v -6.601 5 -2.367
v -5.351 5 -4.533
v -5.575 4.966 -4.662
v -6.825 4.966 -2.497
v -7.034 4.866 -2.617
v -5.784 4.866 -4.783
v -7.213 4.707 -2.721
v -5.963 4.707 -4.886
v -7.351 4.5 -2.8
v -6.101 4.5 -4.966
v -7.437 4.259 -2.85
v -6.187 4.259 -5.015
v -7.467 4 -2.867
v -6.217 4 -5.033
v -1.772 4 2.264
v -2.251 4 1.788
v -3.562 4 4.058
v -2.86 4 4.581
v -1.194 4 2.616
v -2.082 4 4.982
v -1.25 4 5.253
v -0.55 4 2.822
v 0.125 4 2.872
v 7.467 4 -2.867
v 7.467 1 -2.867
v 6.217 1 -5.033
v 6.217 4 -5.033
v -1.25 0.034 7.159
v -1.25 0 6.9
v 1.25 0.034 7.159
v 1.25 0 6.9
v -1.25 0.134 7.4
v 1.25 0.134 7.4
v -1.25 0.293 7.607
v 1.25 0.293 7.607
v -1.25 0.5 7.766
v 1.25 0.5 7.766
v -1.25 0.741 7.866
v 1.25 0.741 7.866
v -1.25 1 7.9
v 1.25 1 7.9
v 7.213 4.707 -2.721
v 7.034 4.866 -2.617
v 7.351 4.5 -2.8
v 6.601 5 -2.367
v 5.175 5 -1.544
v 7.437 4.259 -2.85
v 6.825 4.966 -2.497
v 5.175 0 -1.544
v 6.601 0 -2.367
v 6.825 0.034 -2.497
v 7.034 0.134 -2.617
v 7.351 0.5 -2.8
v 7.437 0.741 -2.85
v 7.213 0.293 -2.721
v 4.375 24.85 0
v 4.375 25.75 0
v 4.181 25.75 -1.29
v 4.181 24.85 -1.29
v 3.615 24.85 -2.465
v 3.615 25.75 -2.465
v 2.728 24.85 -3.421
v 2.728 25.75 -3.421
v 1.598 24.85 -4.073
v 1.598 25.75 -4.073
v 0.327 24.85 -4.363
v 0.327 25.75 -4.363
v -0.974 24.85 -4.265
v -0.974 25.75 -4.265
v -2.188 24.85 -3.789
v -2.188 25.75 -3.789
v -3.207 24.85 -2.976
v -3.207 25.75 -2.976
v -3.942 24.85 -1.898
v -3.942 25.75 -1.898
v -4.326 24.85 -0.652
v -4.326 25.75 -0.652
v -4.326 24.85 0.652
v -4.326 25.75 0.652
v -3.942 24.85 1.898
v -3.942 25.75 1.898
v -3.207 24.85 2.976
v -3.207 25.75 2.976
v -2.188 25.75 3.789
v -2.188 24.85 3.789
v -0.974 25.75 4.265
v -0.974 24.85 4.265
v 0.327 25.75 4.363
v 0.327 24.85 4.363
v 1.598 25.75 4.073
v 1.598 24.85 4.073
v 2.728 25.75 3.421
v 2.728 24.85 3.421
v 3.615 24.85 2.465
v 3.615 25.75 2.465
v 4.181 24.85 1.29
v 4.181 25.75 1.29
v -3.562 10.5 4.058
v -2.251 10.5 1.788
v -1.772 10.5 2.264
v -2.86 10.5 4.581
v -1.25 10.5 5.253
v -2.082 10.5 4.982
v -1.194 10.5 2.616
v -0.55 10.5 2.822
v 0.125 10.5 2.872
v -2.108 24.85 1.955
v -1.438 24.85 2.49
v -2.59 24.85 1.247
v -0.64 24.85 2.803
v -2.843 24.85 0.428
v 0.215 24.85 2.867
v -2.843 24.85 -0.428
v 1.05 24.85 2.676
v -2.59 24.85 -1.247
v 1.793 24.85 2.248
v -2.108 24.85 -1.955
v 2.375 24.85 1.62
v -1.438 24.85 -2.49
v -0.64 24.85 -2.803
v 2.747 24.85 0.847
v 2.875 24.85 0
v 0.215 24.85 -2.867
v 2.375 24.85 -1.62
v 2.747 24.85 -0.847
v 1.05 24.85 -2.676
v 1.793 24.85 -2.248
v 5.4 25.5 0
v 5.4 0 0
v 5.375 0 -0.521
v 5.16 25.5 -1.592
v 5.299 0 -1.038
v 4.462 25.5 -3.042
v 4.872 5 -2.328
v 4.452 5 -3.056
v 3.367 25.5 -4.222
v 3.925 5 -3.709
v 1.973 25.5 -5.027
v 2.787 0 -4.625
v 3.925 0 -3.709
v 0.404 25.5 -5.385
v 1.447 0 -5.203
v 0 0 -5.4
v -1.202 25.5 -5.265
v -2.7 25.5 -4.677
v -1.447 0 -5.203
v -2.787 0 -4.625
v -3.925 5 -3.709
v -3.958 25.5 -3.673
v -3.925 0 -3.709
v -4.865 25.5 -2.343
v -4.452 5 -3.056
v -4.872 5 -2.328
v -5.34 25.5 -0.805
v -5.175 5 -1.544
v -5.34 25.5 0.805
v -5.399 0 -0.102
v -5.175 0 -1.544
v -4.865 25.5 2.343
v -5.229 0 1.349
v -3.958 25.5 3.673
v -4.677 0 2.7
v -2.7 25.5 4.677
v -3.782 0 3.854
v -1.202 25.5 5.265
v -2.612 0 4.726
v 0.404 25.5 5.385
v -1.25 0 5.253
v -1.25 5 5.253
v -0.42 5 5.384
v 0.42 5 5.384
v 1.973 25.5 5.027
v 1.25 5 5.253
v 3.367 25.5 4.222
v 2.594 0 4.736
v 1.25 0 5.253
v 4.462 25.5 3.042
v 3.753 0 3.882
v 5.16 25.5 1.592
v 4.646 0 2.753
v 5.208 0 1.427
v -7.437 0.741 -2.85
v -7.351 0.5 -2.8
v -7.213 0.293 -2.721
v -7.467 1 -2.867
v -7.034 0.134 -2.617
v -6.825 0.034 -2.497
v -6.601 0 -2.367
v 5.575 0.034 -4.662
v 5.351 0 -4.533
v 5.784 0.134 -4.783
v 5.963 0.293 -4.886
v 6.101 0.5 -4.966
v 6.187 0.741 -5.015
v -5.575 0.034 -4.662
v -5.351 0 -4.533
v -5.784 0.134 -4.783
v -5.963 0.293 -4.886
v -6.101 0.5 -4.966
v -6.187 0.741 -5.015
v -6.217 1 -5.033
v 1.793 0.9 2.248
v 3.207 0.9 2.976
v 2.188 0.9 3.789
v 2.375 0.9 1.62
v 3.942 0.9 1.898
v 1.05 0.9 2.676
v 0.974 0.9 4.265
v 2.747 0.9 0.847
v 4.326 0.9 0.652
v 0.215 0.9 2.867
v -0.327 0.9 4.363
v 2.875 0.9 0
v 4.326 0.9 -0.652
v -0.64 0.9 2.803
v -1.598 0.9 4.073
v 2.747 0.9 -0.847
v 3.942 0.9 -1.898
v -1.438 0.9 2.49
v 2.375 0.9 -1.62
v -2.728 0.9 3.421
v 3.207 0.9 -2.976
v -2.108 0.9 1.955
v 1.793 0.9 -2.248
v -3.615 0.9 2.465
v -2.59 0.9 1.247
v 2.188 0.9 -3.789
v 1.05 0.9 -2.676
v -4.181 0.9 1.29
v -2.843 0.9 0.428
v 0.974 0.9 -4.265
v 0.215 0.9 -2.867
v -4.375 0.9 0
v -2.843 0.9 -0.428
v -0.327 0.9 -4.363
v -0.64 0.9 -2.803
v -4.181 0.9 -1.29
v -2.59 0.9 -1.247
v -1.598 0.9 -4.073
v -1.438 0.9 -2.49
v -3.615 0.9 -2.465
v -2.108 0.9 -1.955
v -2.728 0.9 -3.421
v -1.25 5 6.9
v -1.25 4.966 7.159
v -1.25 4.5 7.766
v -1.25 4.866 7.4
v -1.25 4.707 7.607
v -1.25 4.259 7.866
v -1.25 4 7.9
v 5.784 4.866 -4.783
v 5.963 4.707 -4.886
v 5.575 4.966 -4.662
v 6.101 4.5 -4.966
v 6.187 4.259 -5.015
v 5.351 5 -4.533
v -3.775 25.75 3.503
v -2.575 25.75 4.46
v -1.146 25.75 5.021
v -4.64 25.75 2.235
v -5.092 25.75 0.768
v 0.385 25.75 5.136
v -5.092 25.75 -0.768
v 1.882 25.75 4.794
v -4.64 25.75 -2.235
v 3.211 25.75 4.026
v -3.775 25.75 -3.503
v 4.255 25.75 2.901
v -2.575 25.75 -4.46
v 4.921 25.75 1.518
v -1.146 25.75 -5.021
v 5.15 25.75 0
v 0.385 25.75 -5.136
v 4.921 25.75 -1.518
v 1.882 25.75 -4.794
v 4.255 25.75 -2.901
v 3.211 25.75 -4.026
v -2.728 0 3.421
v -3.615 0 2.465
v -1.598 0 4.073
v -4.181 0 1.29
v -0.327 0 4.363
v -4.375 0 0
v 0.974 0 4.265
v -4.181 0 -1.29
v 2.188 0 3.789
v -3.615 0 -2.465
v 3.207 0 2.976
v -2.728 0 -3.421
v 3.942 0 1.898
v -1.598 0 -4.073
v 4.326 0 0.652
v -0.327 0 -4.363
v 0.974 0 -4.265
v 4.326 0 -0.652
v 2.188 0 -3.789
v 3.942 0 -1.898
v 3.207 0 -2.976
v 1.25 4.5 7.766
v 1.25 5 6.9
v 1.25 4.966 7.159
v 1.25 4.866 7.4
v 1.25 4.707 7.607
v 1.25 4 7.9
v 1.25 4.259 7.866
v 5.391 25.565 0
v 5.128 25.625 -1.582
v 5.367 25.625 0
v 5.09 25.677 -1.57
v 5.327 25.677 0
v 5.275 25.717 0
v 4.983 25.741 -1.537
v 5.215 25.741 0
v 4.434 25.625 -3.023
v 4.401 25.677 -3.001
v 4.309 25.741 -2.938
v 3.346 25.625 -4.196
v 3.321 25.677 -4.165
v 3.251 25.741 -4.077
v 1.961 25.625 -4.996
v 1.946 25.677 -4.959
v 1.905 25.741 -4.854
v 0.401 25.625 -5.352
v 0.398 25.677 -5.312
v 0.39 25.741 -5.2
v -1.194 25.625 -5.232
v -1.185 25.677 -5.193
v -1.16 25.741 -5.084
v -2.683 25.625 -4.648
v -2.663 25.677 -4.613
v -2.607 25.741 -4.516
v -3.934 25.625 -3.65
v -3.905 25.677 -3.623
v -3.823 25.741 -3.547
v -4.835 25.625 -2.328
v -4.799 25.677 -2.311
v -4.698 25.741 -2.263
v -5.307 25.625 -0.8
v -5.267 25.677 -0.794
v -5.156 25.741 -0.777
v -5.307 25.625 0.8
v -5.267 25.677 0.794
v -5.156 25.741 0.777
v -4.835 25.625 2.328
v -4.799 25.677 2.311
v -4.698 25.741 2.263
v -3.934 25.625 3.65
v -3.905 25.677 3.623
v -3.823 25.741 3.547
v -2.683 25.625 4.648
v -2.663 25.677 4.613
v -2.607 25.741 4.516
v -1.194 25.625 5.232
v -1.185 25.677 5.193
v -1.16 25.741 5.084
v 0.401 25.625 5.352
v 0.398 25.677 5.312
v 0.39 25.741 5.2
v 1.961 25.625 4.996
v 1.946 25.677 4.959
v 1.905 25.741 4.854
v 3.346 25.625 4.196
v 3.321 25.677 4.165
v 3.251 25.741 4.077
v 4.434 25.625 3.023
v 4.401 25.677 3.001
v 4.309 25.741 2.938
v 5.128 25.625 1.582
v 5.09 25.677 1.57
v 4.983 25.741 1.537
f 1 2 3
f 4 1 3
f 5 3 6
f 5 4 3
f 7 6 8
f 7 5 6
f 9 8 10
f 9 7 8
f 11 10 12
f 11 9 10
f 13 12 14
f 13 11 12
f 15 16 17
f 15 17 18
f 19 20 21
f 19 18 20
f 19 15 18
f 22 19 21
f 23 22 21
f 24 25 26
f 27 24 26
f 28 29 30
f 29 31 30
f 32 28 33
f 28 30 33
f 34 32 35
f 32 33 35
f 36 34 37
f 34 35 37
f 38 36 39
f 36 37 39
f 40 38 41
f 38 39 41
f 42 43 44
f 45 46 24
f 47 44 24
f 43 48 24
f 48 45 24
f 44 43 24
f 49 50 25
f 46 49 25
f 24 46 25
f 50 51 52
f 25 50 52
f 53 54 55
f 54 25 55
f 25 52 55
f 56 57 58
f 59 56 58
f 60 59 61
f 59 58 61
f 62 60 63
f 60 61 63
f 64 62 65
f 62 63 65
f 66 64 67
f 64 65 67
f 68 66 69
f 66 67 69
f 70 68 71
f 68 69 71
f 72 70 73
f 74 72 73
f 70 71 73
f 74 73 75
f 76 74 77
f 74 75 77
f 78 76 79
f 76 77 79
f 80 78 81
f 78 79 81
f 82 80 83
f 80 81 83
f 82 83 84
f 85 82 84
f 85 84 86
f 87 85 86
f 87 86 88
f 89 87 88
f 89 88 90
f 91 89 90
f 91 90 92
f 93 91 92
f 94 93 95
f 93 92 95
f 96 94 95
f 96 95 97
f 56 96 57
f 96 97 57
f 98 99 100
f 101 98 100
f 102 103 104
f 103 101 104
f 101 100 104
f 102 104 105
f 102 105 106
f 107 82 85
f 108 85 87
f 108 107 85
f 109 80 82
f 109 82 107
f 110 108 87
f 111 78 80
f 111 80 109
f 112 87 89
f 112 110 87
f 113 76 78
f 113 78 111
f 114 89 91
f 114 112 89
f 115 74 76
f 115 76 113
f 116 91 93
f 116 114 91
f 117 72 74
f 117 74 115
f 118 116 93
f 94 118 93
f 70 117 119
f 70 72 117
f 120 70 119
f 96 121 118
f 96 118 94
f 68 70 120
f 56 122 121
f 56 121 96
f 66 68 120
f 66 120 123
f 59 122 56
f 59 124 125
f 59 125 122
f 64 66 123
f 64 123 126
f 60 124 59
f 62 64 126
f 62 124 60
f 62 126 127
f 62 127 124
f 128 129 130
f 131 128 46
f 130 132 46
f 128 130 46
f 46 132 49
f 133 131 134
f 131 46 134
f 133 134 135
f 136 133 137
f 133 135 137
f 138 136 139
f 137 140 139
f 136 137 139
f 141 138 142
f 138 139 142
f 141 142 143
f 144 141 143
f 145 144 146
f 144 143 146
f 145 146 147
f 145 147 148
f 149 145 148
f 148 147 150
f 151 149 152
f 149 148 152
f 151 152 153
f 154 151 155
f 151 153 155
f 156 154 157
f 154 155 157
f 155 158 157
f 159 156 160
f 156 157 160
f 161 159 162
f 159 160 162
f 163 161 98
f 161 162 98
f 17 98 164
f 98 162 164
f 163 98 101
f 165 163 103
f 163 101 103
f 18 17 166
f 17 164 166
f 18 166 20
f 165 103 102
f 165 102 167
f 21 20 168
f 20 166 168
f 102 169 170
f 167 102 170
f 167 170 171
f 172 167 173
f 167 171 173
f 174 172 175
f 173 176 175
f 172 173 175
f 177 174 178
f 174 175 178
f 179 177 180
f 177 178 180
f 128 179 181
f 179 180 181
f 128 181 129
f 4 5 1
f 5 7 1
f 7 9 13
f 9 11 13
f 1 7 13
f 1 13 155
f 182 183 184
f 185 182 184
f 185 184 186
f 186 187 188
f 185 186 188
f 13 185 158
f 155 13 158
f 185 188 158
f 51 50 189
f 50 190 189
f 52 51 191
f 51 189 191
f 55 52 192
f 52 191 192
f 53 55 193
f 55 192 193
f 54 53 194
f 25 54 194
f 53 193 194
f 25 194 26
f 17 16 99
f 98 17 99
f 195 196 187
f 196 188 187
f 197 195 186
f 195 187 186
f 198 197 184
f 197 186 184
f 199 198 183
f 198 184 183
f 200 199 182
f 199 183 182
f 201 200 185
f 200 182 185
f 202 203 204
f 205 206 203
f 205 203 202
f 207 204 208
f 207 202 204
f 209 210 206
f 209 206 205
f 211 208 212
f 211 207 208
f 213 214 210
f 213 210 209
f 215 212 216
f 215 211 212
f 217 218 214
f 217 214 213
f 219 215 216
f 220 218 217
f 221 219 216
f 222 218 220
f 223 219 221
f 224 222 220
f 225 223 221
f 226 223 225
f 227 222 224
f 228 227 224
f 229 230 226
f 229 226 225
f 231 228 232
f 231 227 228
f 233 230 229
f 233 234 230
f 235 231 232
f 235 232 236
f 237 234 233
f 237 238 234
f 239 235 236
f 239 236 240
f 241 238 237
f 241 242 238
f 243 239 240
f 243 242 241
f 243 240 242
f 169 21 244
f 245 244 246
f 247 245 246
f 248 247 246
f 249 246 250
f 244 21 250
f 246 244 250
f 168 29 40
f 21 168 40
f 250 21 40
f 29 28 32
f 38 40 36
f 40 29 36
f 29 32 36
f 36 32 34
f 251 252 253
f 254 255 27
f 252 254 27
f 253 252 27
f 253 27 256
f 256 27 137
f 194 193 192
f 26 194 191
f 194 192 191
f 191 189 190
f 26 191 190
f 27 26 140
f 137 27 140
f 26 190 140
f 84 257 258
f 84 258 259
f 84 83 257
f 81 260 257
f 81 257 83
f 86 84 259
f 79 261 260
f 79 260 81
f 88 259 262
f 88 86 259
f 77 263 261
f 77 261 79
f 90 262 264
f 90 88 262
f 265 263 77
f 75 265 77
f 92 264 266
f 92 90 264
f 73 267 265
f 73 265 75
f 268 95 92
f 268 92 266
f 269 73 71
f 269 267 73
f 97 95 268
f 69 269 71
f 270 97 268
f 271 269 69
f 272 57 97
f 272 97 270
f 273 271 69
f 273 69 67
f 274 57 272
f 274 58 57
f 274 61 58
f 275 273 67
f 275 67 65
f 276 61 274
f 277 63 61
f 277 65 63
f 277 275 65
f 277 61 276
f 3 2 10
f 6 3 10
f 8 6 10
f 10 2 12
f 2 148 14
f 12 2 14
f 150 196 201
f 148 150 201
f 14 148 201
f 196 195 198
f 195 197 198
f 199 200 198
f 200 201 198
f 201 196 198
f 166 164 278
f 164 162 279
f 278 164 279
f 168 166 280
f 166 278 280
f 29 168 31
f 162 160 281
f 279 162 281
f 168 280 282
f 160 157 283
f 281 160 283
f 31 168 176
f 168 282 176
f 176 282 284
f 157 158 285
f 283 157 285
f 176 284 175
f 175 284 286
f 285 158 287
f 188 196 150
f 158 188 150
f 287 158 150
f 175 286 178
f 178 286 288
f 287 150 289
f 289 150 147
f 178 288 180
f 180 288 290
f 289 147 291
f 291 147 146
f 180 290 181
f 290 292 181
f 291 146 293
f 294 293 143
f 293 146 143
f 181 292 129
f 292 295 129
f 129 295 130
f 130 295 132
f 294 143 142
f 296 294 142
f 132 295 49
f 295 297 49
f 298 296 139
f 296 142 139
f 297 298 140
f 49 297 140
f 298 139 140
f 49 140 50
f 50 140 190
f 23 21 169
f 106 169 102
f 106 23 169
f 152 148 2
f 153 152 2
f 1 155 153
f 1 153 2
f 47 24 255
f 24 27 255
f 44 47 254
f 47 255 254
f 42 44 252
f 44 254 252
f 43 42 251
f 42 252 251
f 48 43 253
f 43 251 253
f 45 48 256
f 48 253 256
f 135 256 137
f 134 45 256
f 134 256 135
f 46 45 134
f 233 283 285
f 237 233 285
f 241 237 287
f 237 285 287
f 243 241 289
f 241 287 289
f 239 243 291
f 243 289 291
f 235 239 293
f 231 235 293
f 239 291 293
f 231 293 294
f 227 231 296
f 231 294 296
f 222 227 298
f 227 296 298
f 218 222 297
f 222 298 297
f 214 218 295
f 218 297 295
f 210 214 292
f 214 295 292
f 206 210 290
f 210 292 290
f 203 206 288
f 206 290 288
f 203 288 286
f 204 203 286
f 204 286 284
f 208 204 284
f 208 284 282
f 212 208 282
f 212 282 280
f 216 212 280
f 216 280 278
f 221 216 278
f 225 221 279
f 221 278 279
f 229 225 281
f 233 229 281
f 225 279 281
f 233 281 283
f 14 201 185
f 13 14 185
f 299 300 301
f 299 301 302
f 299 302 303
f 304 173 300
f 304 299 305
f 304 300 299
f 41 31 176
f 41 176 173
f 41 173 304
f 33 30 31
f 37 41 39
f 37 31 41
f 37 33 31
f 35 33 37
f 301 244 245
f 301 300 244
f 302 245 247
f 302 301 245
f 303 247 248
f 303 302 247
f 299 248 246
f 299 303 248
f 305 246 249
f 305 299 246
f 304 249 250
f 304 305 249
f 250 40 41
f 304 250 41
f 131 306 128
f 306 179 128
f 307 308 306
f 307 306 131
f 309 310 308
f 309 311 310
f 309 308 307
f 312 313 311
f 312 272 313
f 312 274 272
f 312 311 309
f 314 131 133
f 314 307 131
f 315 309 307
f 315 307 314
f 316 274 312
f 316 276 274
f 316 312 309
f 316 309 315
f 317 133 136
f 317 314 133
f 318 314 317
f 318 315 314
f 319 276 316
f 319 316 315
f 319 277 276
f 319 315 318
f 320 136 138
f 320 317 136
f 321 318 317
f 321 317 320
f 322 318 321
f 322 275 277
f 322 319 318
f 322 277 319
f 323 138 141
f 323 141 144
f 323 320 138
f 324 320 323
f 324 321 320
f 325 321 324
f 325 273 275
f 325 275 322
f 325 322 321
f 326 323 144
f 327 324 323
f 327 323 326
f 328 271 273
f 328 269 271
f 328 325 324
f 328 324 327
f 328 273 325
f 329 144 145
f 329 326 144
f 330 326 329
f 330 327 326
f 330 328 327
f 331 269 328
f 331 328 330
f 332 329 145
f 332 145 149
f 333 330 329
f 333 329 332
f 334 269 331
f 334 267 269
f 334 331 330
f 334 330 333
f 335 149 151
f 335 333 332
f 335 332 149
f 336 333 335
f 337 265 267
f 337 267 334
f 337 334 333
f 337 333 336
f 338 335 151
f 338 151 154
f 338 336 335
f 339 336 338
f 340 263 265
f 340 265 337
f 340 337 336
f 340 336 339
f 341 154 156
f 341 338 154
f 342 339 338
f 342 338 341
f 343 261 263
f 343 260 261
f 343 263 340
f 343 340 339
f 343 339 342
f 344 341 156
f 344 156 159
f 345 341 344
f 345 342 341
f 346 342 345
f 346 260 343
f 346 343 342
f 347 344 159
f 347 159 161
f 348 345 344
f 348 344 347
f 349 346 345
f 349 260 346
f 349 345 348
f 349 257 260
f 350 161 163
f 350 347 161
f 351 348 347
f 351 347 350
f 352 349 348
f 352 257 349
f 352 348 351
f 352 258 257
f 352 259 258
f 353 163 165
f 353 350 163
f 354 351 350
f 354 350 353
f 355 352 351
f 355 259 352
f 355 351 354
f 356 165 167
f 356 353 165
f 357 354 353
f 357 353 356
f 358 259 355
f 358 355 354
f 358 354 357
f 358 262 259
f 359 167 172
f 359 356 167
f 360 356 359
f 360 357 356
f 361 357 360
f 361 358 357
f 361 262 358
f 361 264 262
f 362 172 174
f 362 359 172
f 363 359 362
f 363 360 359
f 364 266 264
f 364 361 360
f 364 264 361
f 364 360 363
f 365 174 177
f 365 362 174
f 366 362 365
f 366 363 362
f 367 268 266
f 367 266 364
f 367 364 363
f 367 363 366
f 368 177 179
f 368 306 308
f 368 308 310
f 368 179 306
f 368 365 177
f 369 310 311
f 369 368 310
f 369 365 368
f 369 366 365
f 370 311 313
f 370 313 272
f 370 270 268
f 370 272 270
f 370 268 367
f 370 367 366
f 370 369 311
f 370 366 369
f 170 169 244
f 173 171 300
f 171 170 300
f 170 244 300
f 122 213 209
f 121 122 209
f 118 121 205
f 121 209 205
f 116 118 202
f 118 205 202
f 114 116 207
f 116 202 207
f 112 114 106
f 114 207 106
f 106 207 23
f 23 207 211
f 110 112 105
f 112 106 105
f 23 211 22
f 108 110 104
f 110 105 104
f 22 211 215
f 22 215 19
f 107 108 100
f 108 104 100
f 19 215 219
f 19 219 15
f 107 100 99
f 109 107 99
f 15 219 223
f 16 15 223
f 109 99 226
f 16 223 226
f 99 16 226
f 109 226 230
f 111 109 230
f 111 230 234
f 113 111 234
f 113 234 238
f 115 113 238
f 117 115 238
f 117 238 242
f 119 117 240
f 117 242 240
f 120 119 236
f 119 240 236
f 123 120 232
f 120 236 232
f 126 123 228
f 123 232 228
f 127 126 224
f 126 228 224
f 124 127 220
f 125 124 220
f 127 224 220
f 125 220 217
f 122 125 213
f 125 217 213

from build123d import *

# Parameters (mm, degrees)
SKETCH1_R           = 5.4
BOSS_EXTRUDE1_DEPTH = 25.75
SKETCH2_W           = 2.5
SKETCH2_H           = 5.463227165
BOSS_EXTRUDE2_DEPTH = 5
FILLET1_R           = 1
FILLET2_R           = 0.25
SKETCH4_R           = 2.875
CUT_EXTRUDE1_DEPTH  = 25.75
SKETCH5_R           = 4.375
CUT_EXTRUDE2_DEPTH  = 0.9
SKETCH6_R           = 4.375
CUT_EXTRUDE3_DEPTH  = 0.9
SKETCH9_W           = 2.6
SKETCH9_H           = 6.5
CUT_EXTRUDE4_DEPTH  = 10


with BuildPart() as part:
    # Sketch1 → Boss-Extrude1 (new body)
    with BuildSketch(Plane(origin=(0, 0, 0), x_dir=(1, 0, 0), z_dir=(0, 1, 0))):
        Circle(SKETCH1_R)
    extrude(amount=BOSS_EXTRUDE1_DEPTH)

    # Sketch2 → Boss-Extrude2 (add)
    with BuildSketch(Plane.XZ):
        Polygon((2.738101985, -0.137468245), (7.46660069, -2.867468245), (6.21660069, -5.032531755), (1.488101985, -2.302531755), align=None)
        with Locations((0, 5.168386418)):
            Rectangle(SKETCH2_W, SKETCH2_H)
        Polygon((-2.738101985, -0.137468245), (-1.488101985, -2.302531755), (-6.21660069, -5.032531755), (-7.46660069, -2.867468245), align=None)
    extrude(amount=-BOSS_EXTRUDE2_DEPTH)

    # Fillet1
    fillet1_edges = [part.edges().sort_by_distance(p)[0] for p in [
        (0, 5, 7.9),
        (0, 0, 7.9),
        (6.84160069, 5, -3.95),
        (6.84160069, 0, -3.95),
        (-6.84160069, 5, -3.95),
        (-6.84160069, 0, -3.95),
    ]]
    fillet(fillet1_edges, radius=FILLET1_R)

    # Fillet2
    fillet2_edges = [part.edges().sort_by_distance(p)[0] for p in [
        (-5.4, 25.75, 0),
    ]]
    fillet(fillet2_edges, radius=FILLET2_R)

    # Sketch4 → Cut-Extrude1 (cut)
    with BuildSketch(Plane.XZ):
        Circle(SKETCH4_R)
    extrude(amount=-CUT_EXTRUDE1_DEPTH, mode=Mode.SUBTRACT)

    # Sketch5 → Cut-Extrude2 (cut)
    with BuildSketch(Plane(origin=(0, 0, 0), x_dir=(-1, 0, 0), z_dir=(0, -1, 0))):
        Circle(SKETCH5_R)
    extrude(amount=-CUT_EXTRUDE2_DEPTH, mode=Mode.SUBTRACT)

    # Sketch6 → Cut-Extrude3 (cut)
    with BuildSketch(Plane(origin=(0, 25.75, 0), x_dir=(1, 0, 0), z_dir=(0, 1, 0))):
        Circle(SKETCH6_R)
    extrude(amount=-CUT_EXTRUDE3_DEPTH, mode=Mode.SUBTRACT)

    # Sketch9 → Cut-Extrude4 (cut)
    with BuildSketch(Plane(origin=(0, 0, 0), x_dir=(0.866025404, 0, 0.5), z_dir=(-0.5, 0, 0.866025404))):
        with Locations((0.244134383, 7.25)):
            Rectangle(SKETCH9_W, SKETCH9_H)
    extrude(amount=CUT_EXTRUDE4_DEPTH, mode=Mode.SUBTRACT)


solid = part.part
